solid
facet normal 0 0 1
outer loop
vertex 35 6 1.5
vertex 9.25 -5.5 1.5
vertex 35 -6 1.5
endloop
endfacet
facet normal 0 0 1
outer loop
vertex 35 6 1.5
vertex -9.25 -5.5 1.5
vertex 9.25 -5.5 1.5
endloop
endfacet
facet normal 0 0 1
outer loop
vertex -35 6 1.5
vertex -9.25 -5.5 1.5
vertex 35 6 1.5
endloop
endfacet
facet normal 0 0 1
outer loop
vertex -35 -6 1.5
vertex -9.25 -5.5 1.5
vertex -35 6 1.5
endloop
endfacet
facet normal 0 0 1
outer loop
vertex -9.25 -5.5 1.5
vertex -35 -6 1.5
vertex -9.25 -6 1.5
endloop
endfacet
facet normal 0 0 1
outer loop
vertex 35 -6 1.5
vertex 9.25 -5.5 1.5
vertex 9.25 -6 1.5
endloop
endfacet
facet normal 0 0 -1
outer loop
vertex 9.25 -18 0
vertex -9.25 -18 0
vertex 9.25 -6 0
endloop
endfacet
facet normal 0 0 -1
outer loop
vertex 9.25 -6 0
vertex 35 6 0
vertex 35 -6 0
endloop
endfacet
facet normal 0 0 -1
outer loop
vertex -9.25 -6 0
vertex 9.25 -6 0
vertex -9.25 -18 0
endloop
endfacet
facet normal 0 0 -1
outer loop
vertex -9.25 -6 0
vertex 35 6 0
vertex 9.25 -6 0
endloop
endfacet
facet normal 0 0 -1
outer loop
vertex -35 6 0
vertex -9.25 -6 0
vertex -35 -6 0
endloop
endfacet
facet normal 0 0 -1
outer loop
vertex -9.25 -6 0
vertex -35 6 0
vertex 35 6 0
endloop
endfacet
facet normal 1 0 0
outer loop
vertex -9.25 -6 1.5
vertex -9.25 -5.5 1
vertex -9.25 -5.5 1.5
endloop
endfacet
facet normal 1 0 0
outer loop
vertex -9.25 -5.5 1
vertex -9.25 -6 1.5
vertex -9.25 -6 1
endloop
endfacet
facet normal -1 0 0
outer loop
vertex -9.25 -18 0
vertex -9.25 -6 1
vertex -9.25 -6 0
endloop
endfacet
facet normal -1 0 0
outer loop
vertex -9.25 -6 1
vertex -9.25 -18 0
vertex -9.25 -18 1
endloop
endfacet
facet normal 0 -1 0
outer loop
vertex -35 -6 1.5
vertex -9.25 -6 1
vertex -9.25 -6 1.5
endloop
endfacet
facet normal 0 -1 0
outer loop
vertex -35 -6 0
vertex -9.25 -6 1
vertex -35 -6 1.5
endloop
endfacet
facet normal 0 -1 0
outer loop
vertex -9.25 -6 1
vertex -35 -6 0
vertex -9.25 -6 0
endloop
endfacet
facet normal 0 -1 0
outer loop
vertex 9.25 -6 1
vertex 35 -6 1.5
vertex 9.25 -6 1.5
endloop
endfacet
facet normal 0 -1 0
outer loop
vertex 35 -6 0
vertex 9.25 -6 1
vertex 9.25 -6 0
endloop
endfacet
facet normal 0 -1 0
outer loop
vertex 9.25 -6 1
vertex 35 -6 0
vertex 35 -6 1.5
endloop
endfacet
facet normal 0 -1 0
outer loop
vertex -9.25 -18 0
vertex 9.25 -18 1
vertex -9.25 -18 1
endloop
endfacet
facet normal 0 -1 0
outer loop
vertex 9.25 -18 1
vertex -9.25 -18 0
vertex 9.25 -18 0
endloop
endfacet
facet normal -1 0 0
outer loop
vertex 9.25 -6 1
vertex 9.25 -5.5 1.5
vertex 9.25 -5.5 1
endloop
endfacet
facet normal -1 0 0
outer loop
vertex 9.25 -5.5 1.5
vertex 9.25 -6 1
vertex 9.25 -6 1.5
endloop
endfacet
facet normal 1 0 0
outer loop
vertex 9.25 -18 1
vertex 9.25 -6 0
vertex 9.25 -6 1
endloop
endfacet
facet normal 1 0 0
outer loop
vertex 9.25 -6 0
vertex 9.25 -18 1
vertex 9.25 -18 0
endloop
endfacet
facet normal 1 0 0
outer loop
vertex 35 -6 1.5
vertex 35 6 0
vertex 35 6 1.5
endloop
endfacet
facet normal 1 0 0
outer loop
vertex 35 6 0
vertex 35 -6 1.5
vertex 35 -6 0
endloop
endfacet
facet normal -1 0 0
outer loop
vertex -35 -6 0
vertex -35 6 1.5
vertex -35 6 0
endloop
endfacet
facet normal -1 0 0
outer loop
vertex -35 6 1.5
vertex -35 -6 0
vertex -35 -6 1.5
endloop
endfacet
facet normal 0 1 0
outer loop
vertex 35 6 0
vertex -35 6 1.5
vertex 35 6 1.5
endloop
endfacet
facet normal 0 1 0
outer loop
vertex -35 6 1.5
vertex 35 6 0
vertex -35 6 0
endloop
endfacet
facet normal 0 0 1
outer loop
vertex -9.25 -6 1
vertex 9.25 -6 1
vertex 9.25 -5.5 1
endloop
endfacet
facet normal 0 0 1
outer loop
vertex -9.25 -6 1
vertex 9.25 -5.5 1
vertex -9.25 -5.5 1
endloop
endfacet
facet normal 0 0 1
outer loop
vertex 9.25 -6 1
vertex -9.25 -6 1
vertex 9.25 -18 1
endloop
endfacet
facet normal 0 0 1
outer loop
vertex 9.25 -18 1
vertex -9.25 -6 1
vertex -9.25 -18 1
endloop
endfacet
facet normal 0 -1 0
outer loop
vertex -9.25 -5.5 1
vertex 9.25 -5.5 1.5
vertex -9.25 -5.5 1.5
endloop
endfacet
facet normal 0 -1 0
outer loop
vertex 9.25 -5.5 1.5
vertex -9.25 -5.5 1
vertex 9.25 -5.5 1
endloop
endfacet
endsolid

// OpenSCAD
// 10-well agarose gel comb, printed lying flat
// Units: mm. Plate thickness (Z) = 1.5 mm.

$fn = 64;

// ---- Spine (back bar) ----
spine_len   = 70;   // spine length along X
spine_wid   = 12;   // spine width along Y

// ---- Teeth ----
tooth_count = 10;   // number of wells
tooth_w     = 5.0;  // tooth width along X
tooth_l     = 12;   // tooth length along Y (same as spine width)

// ---- Pitch ----
pitch       = 1.5;  // centre-to-centre spacing of teeth along X

// ---- Misc ----
eps         = 0.5;  // cutter overshoot past faces
plate_t     = 1.5;  // plate thickness (Z)

// First tooth centre, so the row is centred on the spine
x0 = -(tooth_count - 1) * pitch / 2;

difference() {
    // Plate: spine + teeth, resting on z = 0
    union() {
        translate([-spine_len / 2, -spine_wid / 2, 0])
            cube([spine_len, spine_wid, plate_t]);
        for (i = [0 : tooth_count - 1])
            translate([x0 + i * pitch - tooth_w / 2,
                       -spine_wid / 2 - tooth_l, 0])
                cube([tooth_w, tooth_l, plate_t]);
    }

    // Cut the wells through the top face (z = plate_t)
    for (i = [0 : tooth_count - 1])
        translate([x0 + i * pitch - tooth_w / 2,
                   -spine_wid / 2 - tooth_l - eps,
                   plate_t - eps])
            cube([tooth_w, tooth_l + 2 * eps, 2 * eps]);
}
